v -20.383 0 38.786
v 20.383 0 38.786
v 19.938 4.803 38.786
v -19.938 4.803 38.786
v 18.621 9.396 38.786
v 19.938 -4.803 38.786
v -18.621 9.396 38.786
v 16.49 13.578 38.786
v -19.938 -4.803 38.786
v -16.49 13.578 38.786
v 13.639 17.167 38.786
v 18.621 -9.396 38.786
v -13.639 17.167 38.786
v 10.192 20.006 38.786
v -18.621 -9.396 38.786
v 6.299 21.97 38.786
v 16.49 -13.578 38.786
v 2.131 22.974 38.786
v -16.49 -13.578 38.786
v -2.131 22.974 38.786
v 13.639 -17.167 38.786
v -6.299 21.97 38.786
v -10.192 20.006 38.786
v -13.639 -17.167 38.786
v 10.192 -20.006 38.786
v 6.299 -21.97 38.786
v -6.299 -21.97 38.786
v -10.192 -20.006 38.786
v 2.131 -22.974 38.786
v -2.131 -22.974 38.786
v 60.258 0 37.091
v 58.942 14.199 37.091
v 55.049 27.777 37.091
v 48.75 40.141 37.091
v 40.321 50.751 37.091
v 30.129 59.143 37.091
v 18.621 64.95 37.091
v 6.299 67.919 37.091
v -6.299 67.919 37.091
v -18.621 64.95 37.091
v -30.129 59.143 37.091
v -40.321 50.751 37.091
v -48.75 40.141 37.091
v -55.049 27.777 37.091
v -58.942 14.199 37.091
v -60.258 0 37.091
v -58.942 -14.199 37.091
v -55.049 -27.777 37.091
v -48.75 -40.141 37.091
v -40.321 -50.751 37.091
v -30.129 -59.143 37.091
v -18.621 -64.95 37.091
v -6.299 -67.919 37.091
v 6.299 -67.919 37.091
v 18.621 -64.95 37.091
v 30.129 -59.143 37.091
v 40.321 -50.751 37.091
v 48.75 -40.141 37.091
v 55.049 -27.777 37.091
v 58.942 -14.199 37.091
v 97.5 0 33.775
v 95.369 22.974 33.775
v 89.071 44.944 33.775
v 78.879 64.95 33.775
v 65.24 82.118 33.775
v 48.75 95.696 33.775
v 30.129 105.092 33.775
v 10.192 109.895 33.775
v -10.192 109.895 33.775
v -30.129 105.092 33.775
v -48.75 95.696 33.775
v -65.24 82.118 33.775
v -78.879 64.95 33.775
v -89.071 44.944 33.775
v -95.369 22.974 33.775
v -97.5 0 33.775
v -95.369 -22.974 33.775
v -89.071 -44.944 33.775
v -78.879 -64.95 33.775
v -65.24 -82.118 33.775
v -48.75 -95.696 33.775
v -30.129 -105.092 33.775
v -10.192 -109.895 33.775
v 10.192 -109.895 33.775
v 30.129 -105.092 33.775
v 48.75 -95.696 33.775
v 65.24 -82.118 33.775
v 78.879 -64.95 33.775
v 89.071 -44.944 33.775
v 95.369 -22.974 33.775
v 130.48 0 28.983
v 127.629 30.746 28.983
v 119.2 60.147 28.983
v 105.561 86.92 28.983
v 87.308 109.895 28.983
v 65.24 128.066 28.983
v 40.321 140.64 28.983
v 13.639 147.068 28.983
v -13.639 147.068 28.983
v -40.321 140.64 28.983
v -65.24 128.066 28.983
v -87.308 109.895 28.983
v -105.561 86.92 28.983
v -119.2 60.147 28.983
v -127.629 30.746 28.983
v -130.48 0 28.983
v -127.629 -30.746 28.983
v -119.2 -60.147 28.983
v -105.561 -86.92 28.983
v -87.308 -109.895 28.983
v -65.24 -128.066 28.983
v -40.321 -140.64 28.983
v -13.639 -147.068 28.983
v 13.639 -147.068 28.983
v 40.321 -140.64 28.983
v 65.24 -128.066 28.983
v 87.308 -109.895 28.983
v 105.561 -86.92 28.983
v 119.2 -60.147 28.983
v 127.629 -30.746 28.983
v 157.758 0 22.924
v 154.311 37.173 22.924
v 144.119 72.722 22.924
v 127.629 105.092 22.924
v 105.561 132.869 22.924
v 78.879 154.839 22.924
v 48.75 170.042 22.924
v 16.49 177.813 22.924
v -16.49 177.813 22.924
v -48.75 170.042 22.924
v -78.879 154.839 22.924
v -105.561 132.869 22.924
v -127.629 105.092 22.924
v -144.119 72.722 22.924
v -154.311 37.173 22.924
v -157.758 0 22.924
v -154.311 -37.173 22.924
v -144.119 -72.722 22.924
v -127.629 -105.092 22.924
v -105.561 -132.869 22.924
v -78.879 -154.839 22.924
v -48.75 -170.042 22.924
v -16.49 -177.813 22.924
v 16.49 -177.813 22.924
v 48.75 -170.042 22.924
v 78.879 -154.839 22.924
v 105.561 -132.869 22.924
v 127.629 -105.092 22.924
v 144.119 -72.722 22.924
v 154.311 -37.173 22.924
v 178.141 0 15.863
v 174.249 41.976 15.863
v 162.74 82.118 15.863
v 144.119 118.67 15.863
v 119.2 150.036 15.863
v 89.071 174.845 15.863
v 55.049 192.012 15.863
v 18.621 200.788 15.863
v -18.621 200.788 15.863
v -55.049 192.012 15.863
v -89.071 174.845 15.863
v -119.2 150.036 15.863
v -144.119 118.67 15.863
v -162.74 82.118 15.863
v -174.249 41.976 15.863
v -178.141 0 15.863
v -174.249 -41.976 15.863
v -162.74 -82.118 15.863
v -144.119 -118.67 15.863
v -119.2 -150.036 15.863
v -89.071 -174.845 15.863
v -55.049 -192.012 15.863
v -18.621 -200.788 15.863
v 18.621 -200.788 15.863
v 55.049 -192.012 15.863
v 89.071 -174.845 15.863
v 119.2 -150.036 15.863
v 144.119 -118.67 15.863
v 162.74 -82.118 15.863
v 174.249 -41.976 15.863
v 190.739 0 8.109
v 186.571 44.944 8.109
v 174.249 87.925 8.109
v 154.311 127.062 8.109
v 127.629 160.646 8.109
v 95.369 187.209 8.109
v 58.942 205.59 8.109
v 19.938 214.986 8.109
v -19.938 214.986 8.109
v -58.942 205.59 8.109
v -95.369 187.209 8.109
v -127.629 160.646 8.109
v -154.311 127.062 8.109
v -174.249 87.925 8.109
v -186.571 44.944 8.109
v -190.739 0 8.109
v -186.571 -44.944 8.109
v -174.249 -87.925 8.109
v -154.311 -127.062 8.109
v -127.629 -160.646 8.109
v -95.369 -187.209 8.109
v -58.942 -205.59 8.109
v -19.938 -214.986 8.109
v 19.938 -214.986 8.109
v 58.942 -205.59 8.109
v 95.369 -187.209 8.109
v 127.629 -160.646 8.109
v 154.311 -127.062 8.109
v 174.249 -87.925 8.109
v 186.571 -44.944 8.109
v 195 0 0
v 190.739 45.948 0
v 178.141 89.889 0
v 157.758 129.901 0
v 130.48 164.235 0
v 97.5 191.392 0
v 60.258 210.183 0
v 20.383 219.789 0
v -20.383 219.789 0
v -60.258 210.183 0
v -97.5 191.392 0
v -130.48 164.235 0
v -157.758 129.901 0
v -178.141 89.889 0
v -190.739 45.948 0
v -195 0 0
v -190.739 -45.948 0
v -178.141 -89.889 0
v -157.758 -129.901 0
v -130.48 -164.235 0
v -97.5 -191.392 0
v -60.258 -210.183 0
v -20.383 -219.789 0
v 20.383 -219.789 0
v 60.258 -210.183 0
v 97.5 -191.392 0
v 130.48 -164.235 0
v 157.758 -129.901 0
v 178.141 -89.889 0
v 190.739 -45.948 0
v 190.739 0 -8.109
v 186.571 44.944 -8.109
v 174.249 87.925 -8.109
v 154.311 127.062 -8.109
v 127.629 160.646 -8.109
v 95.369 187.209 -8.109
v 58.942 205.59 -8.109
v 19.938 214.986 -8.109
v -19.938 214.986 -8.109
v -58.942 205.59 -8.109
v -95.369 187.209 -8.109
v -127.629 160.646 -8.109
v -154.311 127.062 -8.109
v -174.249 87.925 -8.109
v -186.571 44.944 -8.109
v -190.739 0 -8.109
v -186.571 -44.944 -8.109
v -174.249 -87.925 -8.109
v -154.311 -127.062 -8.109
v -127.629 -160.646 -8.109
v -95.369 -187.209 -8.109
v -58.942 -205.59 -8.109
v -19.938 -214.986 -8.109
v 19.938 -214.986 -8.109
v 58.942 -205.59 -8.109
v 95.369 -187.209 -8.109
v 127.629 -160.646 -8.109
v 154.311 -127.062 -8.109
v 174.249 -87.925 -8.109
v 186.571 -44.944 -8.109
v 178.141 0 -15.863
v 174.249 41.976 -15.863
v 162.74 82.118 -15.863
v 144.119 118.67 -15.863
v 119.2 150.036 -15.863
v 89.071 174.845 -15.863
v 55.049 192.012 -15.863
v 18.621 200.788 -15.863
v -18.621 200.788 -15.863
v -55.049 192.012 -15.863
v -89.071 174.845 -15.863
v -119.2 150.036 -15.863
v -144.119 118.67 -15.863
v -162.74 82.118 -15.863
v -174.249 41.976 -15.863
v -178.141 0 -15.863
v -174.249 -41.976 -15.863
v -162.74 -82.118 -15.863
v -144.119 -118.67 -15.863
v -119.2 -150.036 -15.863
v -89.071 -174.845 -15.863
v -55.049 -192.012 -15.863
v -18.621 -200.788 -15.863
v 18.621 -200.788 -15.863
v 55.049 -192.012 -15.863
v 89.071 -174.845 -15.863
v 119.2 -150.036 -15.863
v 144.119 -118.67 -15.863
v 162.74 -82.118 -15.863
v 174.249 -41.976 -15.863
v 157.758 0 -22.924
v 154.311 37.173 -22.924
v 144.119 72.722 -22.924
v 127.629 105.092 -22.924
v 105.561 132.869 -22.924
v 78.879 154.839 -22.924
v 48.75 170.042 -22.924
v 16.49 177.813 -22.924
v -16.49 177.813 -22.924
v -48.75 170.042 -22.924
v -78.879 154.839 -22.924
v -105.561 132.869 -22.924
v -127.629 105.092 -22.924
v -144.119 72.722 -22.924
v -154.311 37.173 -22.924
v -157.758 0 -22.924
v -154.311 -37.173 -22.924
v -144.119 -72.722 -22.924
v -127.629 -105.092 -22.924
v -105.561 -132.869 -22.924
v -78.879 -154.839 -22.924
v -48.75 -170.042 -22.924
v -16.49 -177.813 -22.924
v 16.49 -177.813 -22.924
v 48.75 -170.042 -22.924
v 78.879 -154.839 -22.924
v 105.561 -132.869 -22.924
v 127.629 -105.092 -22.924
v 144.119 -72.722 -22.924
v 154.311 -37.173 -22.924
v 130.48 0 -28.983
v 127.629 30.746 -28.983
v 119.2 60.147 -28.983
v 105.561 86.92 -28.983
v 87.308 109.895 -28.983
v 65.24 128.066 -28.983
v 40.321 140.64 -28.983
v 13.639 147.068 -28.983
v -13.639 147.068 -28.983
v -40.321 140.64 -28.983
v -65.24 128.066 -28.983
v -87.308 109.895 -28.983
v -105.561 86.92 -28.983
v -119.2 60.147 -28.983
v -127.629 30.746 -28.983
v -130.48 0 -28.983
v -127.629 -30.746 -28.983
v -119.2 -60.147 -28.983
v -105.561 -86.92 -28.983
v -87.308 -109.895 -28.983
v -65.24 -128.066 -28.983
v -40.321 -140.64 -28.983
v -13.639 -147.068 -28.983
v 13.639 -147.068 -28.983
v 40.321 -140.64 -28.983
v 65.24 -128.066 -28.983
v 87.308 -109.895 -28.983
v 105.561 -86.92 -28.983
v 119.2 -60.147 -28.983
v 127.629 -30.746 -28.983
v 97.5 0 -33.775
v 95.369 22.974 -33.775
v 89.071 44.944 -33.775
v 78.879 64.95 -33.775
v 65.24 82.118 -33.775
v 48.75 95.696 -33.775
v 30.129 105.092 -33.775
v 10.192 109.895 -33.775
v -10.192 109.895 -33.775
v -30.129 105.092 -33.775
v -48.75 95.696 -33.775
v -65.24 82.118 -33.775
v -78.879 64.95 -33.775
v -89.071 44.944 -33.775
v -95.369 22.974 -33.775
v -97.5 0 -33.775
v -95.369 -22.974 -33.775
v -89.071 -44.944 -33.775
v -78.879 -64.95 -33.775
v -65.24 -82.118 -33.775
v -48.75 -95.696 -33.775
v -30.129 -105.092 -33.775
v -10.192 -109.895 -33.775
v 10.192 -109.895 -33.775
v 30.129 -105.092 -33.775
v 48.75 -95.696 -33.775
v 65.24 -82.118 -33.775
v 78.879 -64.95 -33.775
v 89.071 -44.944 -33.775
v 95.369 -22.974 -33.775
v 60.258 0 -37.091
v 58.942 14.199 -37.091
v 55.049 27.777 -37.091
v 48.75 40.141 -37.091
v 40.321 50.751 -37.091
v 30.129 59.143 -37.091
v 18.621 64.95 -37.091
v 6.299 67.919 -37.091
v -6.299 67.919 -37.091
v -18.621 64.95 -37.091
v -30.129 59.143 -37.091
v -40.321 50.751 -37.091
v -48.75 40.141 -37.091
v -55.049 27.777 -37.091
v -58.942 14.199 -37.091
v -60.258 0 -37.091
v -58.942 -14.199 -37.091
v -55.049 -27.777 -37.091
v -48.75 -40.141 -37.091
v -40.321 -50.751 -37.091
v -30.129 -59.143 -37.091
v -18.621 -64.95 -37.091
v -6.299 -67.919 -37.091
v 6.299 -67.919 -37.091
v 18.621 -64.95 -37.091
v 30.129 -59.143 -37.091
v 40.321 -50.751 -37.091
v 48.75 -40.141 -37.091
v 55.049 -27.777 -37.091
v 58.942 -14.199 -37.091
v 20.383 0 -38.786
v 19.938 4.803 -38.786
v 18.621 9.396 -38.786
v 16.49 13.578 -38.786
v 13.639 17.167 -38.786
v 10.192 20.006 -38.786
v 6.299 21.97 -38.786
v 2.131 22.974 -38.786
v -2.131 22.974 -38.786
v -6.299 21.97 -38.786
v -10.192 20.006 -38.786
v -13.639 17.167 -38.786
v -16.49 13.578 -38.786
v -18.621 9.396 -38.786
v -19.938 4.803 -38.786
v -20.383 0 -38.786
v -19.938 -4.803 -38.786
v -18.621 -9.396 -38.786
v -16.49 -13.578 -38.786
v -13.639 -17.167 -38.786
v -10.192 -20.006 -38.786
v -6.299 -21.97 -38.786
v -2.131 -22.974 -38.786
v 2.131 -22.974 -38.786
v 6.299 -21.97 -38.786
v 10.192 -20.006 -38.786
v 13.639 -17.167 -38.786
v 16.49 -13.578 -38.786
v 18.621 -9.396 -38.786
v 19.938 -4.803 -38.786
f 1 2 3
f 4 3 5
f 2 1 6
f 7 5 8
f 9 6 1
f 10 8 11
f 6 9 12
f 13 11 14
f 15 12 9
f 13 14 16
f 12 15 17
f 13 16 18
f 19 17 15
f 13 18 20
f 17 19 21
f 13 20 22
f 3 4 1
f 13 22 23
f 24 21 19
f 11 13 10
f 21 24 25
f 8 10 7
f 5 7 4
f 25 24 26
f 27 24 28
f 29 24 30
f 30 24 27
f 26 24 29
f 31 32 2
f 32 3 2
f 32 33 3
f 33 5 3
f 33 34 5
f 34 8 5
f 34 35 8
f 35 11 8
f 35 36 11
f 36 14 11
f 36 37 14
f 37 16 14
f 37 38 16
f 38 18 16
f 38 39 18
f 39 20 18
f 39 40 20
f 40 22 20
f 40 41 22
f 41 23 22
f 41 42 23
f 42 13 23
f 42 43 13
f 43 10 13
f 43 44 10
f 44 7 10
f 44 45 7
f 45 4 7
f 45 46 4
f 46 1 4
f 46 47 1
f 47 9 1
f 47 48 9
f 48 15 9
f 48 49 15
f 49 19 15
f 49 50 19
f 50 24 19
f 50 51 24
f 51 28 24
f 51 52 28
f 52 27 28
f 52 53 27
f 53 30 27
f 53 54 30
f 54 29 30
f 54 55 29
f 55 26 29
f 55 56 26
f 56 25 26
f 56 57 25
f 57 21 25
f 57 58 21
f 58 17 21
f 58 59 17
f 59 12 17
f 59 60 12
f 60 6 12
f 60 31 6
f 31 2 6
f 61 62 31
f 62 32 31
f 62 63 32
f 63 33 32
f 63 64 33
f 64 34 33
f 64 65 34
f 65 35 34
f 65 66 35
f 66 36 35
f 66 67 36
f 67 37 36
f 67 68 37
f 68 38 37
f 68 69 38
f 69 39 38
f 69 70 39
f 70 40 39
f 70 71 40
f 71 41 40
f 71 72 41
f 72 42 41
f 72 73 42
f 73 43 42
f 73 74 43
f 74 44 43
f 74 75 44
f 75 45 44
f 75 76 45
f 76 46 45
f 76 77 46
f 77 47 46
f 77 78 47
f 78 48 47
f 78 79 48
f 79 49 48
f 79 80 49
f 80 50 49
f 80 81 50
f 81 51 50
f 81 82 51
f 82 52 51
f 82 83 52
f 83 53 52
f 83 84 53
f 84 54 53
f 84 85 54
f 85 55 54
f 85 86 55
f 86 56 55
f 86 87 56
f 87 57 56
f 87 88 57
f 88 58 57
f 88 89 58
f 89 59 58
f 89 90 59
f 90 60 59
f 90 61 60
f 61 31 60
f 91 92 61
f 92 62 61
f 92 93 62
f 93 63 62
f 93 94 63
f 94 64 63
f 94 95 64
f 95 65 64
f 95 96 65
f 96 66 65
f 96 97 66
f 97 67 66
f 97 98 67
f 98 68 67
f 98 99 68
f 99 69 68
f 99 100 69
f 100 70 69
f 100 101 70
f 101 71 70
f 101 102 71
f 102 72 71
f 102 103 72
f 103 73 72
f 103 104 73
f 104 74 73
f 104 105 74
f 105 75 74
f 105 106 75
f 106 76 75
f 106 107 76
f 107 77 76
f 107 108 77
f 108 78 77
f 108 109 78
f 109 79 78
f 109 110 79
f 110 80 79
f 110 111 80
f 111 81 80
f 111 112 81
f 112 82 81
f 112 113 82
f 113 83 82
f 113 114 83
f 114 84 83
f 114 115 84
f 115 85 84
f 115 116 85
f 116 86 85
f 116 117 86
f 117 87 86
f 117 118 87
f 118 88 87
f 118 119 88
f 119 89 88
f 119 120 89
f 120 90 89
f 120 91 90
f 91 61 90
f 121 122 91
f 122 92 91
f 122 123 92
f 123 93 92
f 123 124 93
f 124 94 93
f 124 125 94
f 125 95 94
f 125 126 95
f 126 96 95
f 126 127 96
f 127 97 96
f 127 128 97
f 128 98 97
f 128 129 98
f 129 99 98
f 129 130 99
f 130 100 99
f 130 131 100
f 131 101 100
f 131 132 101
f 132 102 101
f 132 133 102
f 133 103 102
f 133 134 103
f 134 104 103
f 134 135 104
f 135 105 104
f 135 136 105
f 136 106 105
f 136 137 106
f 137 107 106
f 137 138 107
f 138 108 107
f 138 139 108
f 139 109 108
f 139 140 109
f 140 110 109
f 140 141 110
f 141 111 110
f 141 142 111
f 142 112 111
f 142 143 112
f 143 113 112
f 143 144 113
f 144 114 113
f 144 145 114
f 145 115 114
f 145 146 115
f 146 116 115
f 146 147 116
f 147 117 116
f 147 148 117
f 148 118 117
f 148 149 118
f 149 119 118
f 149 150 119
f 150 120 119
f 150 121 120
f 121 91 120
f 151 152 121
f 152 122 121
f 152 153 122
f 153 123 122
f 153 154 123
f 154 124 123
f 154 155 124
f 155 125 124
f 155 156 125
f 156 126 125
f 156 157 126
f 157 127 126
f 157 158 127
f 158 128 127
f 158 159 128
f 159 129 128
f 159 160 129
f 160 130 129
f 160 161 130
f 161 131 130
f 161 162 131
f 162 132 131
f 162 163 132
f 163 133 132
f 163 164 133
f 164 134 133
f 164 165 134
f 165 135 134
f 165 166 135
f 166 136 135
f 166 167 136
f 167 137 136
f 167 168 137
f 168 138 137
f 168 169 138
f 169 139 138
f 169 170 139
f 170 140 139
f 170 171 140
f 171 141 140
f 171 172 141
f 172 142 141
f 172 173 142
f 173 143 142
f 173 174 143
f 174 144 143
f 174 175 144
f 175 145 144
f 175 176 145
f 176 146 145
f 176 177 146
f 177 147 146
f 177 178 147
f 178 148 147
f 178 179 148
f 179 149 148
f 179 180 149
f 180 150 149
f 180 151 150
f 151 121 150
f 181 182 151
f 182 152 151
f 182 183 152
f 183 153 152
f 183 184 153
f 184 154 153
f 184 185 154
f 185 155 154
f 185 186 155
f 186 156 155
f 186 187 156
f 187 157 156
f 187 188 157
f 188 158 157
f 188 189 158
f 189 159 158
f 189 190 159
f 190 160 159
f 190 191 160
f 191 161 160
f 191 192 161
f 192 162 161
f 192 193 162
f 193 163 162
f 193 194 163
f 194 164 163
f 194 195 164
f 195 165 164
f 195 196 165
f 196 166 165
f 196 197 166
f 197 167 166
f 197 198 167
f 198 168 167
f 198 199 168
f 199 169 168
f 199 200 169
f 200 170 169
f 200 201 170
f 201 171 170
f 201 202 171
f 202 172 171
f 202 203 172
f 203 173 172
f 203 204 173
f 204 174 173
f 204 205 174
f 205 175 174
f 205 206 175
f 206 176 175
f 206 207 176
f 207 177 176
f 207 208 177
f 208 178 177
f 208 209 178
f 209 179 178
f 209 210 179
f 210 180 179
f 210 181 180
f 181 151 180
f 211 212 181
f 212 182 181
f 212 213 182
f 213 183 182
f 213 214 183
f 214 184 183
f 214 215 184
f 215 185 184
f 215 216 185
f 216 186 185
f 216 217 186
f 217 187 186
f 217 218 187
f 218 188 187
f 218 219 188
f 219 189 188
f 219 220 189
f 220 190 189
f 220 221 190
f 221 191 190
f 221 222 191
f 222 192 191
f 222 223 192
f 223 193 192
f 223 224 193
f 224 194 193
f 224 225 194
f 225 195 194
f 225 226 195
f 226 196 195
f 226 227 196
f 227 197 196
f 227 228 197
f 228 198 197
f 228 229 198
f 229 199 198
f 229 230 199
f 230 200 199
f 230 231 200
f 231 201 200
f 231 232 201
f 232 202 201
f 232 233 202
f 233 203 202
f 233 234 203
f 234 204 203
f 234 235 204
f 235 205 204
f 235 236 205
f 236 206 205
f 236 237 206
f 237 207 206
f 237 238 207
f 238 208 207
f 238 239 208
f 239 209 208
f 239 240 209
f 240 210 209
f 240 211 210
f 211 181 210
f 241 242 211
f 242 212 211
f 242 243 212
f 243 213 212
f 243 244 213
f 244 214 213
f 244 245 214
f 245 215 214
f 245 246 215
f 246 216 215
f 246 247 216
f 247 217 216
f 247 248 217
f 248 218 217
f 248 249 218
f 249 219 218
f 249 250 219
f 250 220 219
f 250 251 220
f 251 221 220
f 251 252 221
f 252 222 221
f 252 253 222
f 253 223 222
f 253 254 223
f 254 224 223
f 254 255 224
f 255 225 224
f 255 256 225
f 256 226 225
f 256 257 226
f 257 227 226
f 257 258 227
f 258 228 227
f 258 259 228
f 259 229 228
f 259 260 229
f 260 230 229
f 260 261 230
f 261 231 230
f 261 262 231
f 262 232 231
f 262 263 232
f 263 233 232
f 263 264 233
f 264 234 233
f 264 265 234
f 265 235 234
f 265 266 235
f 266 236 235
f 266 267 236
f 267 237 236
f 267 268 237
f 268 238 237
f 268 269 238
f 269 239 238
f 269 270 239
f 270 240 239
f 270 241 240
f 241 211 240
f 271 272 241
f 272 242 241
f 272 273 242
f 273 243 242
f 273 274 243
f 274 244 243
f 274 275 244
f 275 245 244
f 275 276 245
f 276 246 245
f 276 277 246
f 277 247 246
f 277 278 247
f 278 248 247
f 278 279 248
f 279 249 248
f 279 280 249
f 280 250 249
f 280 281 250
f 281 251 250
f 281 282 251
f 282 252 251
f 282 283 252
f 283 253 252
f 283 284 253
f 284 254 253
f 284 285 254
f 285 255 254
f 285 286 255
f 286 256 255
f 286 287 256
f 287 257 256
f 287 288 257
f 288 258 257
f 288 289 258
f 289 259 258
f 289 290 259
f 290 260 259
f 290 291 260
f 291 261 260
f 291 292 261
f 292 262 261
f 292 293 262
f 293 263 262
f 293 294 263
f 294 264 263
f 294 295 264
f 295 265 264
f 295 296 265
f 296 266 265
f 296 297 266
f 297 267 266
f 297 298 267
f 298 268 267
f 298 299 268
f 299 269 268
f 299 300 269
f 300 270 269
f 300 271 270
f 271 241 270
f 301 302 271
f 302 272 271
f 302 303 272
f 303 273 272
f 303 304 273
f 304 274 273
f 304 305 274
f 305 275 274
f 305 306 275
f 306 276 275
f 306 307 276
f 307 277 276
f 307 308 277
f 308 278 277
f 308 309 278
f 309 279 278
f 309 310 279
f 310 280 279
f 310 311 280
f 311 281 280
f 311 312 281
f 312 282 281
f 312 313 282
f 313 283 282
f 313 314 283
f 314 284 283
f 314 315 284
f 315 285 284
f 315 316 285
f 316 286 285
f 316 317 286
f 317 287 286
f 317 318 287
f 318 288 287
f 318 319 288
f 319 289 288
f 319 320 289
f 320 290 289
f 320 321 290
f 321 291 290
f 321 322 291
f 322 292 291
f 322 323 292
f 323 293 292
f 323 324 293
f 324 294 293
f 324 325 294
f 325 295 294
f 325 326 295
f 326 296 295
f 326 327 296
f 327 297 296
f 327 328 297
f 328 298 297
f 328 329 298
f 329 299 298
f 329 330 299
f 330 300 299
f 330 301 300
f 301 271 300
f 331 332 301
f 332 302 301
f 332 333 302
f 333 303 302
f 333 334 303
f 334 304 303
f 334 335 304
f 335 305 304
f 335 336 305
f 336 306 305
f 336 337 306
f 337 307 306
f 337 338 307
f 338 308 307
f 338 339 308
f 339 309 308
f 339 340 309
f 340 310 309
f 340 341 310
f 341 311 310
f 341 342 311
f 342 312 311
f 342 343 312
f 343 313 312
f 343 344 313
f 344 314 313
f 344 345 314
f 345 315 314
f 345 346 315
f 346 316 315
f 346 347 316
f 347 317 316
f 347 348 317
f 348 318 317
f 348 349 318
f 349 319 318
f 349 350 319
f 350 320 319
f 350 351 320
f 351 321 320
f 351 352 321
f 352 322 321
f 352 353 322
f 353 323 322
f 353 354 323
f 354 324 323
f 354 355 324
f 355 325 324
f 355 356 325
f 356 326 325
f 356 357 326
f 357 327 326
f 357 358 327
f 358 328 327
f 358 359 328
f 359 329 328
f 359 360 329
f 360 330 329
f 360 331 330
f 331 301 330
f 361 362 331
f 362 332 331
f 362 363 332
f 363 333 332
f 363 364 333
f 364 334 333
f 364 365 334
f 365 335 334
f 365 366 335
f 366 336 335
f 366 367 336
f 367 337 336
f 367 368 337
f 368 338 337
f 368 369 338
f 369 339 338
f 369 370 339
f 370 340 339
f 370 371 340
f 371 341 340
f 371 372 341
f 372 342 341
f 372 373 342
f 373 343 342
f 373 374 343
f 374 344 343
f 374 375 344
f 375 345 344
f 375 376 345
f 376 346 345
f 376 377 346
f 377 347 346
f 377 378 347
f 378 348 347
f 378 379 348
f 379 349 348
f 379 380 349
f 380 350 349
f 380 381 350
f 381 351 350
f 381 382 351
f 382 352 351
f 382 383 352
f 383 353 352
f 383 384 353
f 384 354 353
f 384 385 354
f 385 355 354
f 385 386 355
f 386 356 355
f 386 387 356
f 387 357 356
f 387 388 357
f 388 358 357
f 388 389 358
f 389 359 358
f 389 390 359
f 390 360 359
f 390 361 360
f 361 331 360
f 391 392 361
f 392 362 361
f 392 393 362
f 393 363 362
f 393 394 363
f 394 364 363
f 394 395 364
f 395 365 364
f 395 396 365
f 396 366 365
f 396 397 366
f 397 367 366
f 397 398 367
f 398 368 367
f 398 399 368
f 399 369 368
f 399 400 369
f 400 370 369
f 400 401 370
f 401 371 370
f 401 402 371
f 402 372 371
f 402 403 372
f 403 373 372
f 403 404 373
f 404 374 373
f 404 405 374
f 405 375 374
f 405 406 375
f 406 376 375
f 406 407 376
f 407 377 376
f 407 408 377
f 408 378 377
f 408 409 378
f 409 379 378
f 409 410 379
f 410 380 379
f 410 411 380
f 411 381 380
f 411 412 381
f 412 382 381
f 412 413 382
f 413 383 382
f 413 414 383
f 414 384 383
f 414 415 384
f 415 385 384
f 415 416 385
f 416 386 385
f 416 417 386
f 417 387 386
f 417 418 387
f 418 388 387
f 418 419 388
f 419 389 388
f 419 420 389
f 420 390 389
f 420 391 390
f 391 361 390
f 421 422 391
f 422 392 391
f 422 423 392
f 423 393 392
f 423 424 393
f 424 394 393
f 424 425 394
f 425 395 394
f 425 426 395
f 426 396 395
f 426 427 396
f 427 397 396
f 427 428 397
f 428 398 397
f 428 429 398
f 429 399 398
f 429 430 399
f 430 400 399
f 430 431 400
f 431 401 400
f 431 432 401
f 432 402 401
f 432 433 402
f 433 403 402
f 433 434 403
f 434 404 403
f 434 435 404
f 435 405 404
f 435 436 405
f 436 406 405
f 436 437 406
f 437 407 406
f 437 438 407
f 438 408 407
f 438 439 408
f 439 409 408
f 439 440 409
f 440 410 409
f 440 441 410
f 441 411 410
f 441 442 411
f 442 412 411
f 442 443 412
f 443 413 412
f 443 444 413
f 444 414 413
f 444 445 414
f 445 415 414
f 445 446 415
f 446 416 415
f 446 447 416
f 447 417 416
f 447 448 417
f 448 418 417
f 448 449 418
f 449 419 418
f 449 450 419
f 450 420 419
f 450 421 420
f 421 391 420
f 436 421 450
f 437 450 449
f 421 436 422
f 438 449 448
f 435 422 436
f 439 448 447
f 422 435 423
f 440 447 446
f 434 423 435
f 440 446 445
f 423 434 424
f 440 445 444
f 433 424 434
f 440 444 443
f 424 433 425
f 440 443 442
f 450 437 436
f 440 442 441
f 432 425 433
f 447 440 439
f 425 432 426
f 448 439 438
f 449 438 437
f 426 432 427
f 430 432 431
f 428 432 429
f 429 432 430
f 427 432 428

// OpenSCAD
// Generated by SolidPython 1.0.1 on 2020-07-29 00:46:52


scale(v = [15, 17, 3]) {
	sphere(r = 13);
}
/***********************************************
*********      SolidPython code:      **********
************************************************
 
# import packages: SolidPython
from solid import *
from solid.utils import *
from itertools import chain, combinations, permutations


class Resize:

    def __init__(self, scad_file):
        self.scad_file = scad_file
        #self.scad_file = import_scad(scad_file)
        # cone/cylinder param:
        self.r1 = 0
        self.r2 = 0
        self.h = 0
        # rectangular prism param:
        self.w = 0
        self.l = 0
        # ellipse param:
        self.r = 0

    # import OpenScad code (file name corresponds to shape)


    # classify shape + parameters
    def assign(self, param1, param2, param3):
        if self.scad_file == 'cone.scad':
            self.r1 = param1
            self.r2 = param2
            self.h = param3
        elif self.scad_file == 'cylinder.scad':
            self.r1 = param1
            self.r2 = param2
            self.h = param3
        elif self.scad_file == 'rectangularPrism.scad':
            self.h = param1
            self.l = param2
            self.w = param3
        else:
            self.r = param1
            self.h = param2

    # resize parameters
    def iterate(self):
        x = range(3, 20, 2)
        i = 1
        if self.scad_file == 'cone.scad':
            tempList = list(permutations(x, 2))
            for temp in tempList:
                param1 = temp[0]
                param2 = temp[1]
                filepath = 'produced_scad_files/' + 'cone' + str(param1) + '_' + str(param2) + '_' + '.scad'
                scad_render_to_file(cylinder(h=param1, r1=param2, r2=0), filepath)

        elif self.scad_file == 'cylinder.scad':
            tempList = list(permutations(x, 3))
            for temp in tempList:
                param1 = temp[0]
                param2 = temp[1]
                filepath = 'produced_scad_files/' + 'cylinder' + str(param1) + '_' + str(param2) + '_' + '.scad'
                scad_render_to_file(cylinder(h=param1, r1=param2, r2=param2), filepath)

        elif self.scad_file == 'rectangularPrism.scad':
            tempList = list(permutations(x, 3))
            for temp in tempList:
                param1 = temp[0]
                param2 = temp[1]
                param3 = temp[2]
                filepath = 'produced_scad_files/' + 'rectangularPrism' + str(param1) + '_' + str(param2) + '_' + str(
                    param3) + '.scad'
                scad_render_to_file(cube(size=(param1, param2, param3)), filepath)

        elif self.scad_file == 'ellipse.scad':
            tempList = list(permutations(x, 4))
            for temp in tempList:
                param1 = temp[0]
                param2 = temp[1]
                param3 = temp[2]
                param4 = temp[3]
                filepath = 'produced_scad_files/' + 'ellipse' + str(param1) + '_' + str(param2) + '_' + str(param3) + '_' + str(param4) + '.scad'
                scad_render_to_file(scale([param1, param2, param3])(sphere(r=param4)), filepath)

    def render_to_scadfile(self):
        scad_render_to_file(scad, 'example.scad') 
 
************************************************/
